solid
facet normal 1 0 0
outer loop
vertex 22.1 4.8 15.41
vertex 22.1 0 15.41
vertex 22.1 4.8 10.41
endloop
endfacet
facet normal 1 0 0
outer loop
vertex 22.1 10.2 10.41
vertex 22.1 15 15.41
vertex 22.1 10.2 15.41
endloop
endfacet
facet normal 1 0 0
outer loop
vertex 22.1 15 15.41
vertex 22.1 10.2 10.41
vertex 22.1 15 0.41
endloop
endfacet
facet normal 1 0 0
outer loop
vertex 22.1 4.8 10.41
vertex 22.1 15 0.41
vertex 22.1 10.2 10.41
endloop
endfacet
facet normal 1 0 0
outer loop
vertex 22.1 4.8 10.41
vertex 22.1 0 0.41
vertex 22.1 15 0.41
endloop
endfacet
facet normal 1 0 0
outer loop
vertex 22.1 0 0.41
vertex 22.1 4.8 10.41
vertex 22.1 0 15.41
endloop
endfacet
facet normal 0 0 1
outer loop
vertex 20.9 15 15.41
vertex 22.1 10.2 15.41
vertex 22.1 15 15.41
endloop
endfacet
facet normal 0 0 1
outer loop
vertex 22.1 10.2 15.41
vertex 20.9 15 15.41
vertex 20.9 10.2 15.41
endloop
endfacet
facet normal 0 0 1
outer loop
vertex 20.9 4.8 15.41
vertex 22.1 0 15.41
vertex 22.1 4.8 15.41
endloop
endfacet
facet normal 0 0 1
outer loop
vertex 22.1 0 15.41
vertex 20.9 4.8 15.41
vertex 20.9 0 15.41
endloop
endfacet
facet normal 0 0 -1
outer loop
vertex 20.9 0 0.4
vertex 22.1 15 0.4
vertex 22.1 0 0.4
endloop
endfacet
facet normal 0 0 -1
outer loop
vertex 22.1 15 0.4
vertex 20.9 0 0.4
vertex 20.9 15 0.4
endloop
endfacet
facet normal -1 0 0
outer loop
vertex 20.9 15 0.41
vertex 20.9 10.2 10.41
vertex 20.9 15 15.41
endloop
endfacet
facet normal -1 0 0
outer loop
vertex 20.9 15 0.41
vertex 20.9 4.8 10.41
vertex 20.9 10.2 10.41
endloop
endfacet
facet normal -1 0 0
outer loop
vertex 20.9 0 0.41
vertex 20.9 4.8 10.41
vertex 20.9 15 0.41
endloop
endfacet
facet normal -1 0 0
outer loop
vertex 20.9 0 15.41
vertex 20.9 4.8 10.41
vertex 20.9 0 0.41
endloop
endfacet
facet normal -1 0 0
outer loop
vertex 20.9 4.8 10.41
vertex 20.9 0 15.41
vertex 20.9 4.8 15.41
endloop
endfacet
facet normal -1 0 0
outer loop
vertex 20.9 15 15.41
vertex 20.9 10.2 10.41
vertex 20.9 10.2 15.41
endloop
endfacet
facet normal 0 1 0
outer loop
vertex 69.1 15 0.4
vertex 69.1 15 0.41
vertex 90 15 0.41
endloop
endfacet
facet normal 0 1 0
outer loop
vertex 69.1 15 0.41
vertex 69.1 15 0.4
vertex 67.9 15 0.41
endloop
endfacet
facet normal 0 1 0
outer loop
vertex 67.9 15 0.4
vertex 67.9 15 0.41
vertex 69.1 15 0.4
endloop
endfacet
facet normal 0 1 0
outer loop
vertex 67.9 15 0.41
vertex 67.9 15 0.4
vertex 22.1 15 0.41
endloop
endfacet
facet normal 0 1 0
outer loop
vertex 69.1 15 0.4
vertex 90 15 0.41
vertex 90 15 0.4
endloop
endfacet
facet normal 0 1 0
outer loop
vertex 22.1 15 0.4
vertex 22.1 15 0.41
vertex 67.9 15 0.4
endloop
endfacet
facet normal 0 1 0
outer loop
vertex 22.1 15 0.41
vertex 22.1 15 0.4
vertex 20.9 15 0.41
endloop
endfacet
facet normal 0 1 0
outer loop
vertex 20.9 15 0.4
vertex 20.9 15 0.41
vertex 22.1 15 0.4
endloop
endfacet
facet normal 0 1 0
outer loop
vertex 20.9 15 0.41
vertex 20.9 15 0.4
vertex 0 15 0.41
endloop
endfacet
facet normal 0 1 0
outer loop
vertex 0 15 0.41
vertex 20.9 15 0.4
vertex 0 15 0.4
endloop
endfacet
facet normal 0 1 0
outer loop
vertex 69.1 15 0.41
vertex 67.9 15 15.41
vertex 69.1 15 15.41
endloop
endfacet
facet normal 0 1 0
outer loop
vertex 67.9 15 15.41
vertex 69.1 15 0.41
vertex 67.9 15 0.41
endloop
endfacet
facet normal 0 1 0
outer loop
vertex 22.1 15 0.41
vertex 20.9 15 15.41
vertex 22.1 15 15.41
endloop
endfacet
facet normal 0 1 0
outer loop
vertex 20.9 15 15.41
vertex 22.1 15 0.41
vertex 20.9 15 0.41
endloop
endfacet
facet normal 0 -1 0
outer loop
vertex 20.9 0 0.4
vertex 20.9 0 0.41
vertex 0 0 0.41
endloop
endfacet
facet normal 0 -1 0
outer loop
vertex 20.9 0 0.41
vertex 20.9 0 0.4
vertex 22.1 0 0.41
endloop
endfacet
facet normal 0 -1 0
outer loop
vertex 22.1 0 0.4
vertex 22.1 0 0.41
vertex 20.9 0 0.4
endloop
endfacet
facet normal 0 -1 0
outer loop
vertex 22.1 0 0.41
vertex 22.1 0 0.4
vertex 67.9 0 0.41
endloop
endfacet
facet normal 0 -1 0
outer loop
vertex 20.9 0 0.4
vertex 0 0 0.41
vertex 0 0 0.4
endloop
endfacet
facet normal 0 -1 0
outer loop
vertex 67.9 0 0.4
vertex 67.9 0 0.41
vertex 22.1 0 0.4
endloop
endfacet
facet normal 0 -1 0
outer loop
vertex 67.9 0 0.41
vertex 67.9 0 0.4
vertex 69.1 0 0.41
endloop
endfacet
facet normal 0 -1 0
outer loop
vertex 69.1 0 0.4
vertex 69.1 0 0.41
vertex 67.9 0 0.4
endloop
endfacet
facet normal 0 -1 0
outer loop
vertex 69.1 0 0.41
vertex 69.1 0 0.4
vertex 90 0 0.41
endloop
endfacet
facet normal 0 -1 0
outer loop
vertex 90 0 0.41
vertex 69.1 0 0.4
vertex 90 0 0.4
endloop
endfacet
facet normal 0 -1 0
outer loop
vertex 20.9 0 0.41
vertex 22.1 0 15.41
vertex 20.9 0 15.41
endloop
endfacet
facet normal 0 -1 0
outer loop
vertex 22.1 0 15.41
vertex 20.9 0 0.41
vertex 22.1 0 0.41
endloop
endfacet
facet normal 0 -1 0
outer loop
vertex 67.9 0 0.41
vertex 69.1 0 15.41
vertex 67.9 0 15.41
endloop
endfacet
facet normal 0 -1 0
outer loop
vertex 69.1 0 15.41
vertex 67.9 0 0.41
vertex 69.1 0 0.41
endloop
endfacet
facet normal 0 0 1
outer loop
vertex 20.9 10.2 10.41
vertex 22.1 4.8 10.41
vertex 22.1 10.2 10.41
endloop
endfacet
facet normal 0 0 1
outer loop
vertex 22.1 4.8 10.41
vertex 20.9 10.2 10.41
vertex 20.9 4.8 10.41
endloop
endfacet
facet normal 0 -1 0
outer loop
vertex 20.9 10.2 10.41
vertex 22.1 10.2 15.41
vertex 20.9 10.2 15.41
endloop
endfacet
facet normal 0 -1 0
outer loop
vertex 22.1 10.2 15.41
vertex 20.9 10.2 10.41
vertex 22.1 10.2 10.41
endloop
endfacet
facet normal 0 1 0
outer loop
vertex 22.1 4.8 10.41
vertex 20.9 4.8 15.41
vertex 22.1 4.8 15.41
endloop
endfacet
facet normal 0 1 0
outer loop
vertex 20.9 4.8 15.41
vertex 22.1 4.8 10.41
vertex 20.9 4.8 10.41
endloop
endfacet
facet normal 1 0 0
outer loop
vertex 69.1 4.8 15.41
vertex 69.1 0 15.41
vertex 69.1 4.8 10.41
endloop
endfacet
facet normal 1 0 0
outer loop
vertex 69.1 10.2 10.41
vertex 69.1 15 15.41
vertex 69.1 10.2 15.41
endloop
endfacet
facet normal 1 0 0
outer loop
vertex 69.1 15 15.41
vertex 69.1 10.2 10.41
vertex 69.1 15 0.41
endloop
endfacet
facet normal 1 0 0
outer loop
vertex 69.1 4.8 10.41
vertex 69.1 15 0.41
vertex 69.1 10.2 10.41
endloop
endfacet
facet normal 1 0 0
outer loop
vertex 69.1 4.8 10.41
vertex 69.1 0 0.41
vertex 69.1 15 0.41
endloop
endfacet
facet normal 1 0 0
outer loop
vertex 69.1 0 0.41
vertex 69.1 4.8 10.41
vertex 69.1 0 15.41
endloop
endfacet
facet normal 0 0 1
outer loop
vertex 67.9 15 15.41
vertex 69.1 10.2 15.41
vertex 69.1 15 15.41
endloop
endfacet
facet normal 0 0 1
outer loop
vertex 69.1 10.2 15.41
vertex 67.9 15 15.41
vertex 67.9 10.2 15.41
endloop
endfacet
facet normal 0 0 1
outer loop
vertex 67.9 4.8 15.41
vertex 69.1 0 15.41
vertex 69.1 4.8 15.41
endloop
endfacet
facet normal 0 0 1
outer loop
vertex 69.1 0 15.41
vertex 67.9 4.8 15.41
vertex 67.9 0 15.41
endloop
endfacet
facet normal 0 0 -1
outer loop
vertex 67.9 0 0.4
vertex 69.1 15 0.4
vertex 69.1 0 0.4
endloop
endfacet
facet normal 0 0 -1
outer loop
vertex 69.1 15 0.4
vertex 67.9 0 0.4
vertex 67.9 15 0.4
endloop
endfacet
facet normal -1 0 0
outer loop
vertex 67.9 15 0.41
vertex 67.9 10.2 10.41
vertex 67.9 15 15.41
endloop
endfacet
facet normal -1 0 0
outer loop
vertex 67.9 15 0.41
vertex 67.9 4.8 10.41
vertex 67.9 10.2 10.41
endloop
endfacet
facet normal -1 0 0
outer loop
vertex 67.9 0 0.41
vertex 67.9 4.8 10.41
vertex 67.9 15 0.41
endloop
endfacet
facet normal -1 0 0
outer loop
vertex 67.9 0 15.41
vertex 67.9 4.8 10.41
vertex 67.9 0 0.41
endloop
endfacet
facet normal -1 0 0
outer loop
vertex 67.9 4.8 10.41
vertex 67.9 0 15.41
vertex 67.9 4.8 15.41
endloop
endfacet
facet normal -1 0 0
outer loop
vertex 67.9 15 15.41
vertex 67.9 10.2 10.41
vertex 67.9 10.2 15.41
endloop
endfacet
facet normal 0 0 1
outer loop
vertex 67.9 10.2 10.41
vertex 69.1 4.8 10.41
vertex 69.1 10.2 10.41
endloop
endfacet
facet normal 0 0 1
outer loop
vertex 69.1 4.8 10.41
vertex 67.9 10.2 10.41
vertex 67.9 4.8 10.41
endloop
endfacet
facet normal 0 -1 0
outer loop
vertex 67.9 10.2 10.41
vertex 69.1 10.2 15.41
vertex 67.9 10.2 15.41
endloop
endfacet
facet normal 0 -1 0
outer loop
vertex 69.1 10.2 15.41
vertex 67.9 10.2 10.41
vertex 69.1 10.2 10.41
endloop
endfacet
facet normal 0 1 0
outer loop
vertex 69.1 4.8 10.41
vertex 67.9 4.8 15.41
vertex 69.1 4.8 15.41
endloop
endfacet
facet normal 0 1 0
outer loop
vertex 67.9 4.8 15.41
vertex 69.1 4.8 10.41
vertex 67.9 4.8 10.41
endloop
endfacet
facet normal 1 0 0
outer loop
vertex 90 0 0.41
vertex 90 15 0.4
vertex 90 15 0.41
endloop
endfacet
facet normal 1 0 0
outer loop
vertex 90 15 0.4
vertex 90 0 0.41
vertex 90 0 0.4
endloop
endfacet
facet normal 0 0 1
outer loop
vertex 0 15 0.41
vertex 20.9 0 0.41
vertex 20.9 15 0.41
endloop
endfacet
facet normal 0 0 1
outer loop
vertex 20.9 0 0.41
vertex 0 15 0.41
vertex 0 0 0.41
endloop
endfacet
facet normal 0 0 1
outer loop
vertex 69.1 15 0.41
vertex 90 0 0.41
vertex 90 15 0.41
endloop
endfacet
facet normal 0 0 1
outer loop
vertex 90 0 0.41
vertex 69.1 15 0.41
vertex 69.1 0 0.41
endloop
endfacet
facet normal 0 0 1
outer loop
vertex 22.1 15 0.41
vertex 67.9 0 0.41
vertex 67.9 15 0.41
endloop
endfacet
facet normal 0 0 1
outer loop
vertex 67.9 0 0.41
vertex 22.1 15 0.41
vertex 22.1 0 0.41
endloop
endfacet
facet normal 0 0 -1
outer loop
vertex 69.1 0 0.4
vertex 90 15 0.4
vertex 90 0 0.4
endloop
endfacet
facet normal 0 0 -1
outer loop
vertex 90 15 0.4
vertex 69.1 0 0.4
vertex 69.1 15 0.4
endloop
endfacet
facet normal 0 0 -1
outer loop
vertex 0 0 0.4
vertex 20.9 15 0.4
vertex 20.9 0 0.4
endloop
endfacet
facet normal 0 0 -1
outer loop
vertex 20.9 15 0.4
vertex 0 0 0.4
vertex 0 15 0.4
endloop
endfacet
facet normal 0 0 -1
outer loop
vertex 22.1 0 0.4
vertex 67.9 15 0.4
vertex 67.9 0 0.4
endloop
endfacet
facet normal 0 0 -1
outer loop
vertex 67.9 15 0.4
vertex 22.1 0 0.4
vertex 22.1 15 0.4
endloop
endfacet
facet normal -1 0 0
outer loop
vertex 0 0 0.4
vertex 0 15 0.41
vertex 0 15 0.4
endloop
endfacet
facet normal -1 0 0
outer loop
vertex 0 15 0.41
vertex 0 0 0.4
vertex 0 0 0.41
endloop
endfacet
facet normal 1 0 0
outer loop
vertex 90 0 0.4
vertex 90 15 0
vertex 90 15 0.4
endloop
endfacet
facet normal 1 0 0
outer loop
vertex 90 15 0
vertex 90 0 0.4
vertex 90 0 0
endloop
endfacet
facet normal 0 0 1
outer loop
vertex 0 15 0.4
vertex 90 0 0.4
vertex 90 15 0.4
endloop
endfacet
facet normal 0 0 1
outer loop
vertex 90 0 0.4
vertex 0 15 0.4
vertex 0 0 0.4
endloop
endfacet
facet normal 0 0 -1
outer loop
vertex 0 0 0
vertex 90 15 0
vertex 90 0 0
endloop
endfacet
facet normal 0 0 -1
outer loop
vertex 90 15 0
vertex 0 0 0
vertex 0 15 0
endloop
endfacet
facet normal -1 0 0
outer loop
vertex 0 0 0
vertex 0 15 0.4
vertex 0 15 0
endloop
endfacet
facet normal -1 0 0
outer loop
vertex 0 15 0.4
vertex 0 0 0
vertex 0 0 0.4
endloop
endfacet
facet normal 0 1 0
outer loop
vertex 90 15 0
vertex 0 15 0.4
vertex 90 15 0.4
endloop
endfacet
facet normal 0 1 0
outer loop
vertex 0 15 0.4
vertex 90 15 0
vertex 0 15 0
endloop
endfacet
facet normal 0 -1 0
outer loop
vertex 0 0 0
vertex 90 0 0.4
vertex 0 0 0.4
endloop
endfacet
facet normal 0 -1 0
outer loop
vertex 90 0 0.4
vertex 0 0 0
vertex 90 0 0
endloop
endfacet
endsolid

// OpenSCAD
// file: ../../Base/Rotation.scad
// Fischertechnik Box Foundation
// Geometry Helpers Rotation

include <PlacementOptions.scad>

// getRotatedSpace(space, rotation=NoRotation)
// Rotates the space dependent on the specified rotation

function getRotatedSpace(space, rotation=NoRotation) = [
    (rotation == Rotate90 || rotation == Rotate270) ? space.y : space.x,
    (rotation == Rotate90 || rotation == Rotate270) ? space.x : space.y
];

// Rotates the given space around the fixed left lower corner
// space = the space the children needs as width/depth list [width,depth]
// rotation = 0 Rotate0 degrees, 1 Rotate90 degrees, 2 Rotate180 degrees, 3 Rotate270 degrees (equivalent to -90)

module RotateFix(space, rotation=NoRotation) {
    dy = (rotation == Rotate0 || rotation == Rotate270) ? 0 :
        (rotation == Rotate90) ? space.x :
        space.y;
    dx = (rotation < Rotate180) ? 0 :
        (rotation == Rotate180) ? space.x :
        space.y;
    
    translate([dx, dy, 0])
        rotate([0, 0, rotations[rotation]])
            children();
}
// file: ../../Base/Alignment.scad
// Fischertechnik Box Foundation
// Geometry Helpers Alignment

include <PlacementOptions.scad>

// getAlignedX(elementWidth, spaceWidth, align=AlignRight, offset=0)
// Gets the aligned X offset of an element with the given
// width in the given space.
// elementWidth = The width of the element to positon
// spaceWidth = The space where the element should be aligned
// align = 0 AlignLeft, 1 AlignCenter, 2 AlignRight
// offset = an optional offset from the aligned position. When
// aligned left or centered, then positive values are in X direction.
// When aligned right then positive values are in negative X direction.

function getAlignedX(elementWidth, spaceWidth, align=AlignRight, offset=0) =
    (align == AlignLeft) ?
        offset :
        ((align == AlignCenter) ?
        (spaceWidth - elementWidth)/2 + offset :
        spaceWidth - offset - elementWidth);

// getAlignedY(elementDepth, spaceDepth, align=AlignTop, offset=0)
// Gets the aligned Y offset of an element with the given
// depth in the given space.
// elementDepth = The depth of the element to positon
// spaceDepth = The space where the element should be aligned
// align = 0 AlignBottom, 1 AlignCenter, 2 AlignTop
// offset = an optional offset from the aligned position. When
// aligned bottom or centered, then positive values are in Y direction.
// When aligned top then positive values are in negative Y direction.

function getAlignedY(elementDepth, spaceDepth, align=AlignTop, offset=0) =
    (align == AlignBottom) ?
        offset :
        ((align == AlignCenter) ?
        (spaceDepth - elementDepth)/2 + offset :
        spaceDepth - offset - elementDepth);
// file: ../../Base/PlacementOptions.scad
// Fischertechnik Box Foundation
// Placement Options

// Alignment
NoAlign = 0;
AlignLeft = 1;
AlignBottom = 2;
AlignCenter = 3;
AlignRight = 4;
AlignTop = 5;

// Element rotation degree steps
rotations = [0, -90, -180, -270];

// Rotation
NoRotation = 0;
Rotate0 = 0;
Rotate90 = 1;
Rotate180 = 2;
Rotate270 = 3;

// Docking (seen from above)
NoDock = -1;
DockLeft = 0;
DockTop = 1;
DockRight = 2;
DockCorner = 2;
DockBottom = 3;

// Web corners
LowerLeft = 0;
UpperLeft = 1;
UpperRight = 2;
LowerRight = 3;

// Web position relative to corner
LeftOfCorner = 0;
RightOfCorner = 1;
// file: ../../Base/Boxes.scad
// Fischertechnik Box Foundation
// Pre-designed Boxes

use <Constants.scad>

include <PlacementOptions.scad>

box190Width = 190;
box190Depth = 130;
box130Width = 130;
box130Depth = 95;

// Values are from an original ec3 box
topBottomDifference = 1.5;
outerHeight = 40;
innerHeight = 38.2;
baseThickness = outerHeight - innerHeight;
stackExcess = 5.7;
radius = 3.5;
wallThickness = 1.5;
tolerance = 0.2;
stackOffset = innerHeight - stackExcess;

boxUsageHeight = stackOffset;
boxWallThickness = wallThickness;
boxBaseThickness = baseThickness;
boxWebWidth = 3.0;

// getBoxWallThickness()
// Gets the wall thickness of a Fischertechnik Box
function getBoxWallThickness() = boxWallThickness;

// getBoxUsageHeight()
// Gets the usable height of a Fischertechnik box
function getBoxUsageHeight() = boxUsageHeight;

// getBoxInnerHeight()
// Gets the inner height of a Fischertechnik box, including the stack excess
function getBoxInnerHeight() = innerHeight;

// getBoxBaseThickness()
// Gets the thickness of the Fischertechnik box base.
function getBoxBaseThickness() = boxBaseThickness;

// getBoxWebWidth()
// Gets the width of a box web
function getBoxWebWidth() = boxWebWidth;

// getBox190Space()
// Gets the usable inner space of a Box 190 as an x/y-list
function getBox190Space() = [
    box190Width - 2*getBoxWallThickness() - topBottomDifference, 
    box190Depth - 2*getBoxWallThickness() - topBottomDifference ];

// BoxBase(width, depth)
// Creates an empty stackable Fischertechnik compatible box
// width = Outer width of the box (190, 130, ...)
// depth = Outer depth of the box (130, 95, ...)

module BoxBase(width, depth, height=outerHeight) {    
    thinPlate = 0.01;

    innerHeight = height - baseThickness;    
    
    module BodyPlate(width, depth) {
        translate([radius, radius])
        hull() {
            w = width-2*radius;
            d = depth-2*radius;
            cube([w, d, thinPlate]);
            cylinder(thinPlate, r=radius, $fn=getFragments());
            translate([w, 0])
                cylinder(thinPlate, r=radius, $fn=getFragments());
            translate([w, d])
                cylinder(thinPlate, r=radius, $fn=getFragments());
            translate([0, d])
                cylinder(thinPlate, r=radius, $fn=getFragments());
        }
    }
    
    module Body(tolerance=tolerance) {
        hull() {
            // Bottom with tolerance to fit into the original boxes when stacked
            translate([-wallThickness+tolerance, -wallThickness+tolerance, -baseThickness])
                BodyPlate(width-topBottomDifference-2*tolerance, depth-topBottomDifference-2*tolerance);
            
            // Top
            translate([-wallThickness-topBottomDifference/2, -wallThickness-topBottomDifference/2, innerHeight-thinPlate])
                BodyPlate(width, depth);
         }
    }

    module Cutoff() {
        hull() {
            coWidth = width - 2*wallThickness;
            coDepth = depth - 2*wallThickness;
            
            // Bottom
            BodyPlate(coWidth-topBottomDifference, coDepth-topBottomDifference);

            // Top
            translate([-topBottomDifference/2, -topBottomDifference/2, innerHeight+thinPlate]) 
                BodyPlate(coWidth, coDepth);
        }
    }
    
    difference() {        
        Body();
        Cutoff();
        stackOffset = innerHeight - stackExcess;
        translate([0, 0, stackOffset + baseThickness])
            Body(tolerance=0);
    }
}

// Creates the Fischertechnik empty box 130x190 mm and places it at position 0,0
// 190x130 are the outer sizes, the inner space is slightly smaller. Use getBox190Space() to get the inner sizes.
// The box is positioned that the usable inner space is at the 0,0,0 position. The

module Box190() {
    BoxBase(box190Width, box190Depth);
}

// Gets the usable inner space of a Box 130 as an x/y-list
function getBox130Space() = [
    box130Width - 2*getBoxWallThickness() - topBottomDifference, 
    box130Depth - 2*getBoxWallThickness() - topBottomDifference ];

// Creates the Fischertechnik empty box 95x130 mm and places it at position 0,0
// 190x130 are the outer sizes, the inner space is slightly smaller. Use getBox190Space() to get the inner sizes.
// The box is positioned that the usable inner space is at the 0,0,0 position. The

module Box130() {
    BoxBase(box130Width, box130Depth);
}

// Creates a web at the specified box walls
// corner 0 = LowerLeft, 1 = UpperLeft, 2 = UpperRight, 3 = LowerRight
// side 0 = LeftOfCorner, 1 = RightOfCorner
// distance = Distance in mm from the corner
// boxSpace = inner width and depth of the box (default: Box 190)
// webWidth = length of the web (default is 3 mms)
// webThickness = thickness of the web (default is 1 mm)

module BoxWeb(corner, side, distance, boxSpace=getBox190Space(), webWidth=getBoxWebWidth(), webThickness=1.0) {
    sink = getBoxWallThickness()/2;

    width = (corner % 2 == 0) ? 
            (side == LeftOfCorner ? webWidth : webThickness) :
            (side == LeftOfCorner ? webThickness : webWidth);

    depth = (corner % 2 == 0) ? 
            (side == RightOfCorner ? webWidth : webThickness) :
            (side == RightOfCorner ? webThickness : webWidth);
    
    xDiff = corner == LowerLeft ? 
                (side == LeftOfCorner ? -sink : distance) :
            (corner == UpperLeft ?                
                (side == LeftOfCorner ? distance : -sink) :
            (corner == UpperRight ?
                (side == LeftOfCorner ? boxSpace.x-webWidth+sink : boxSpace.x-distance-webThickness) :
                (side == LeftOfCorner ? boxSpace.x-distance-webThickness: boxSpace.x-webWidth+sink)));

    yDiff = corner == LowerLeft ? 
                (side == RightOfCorner ? -sink : distance) :
            (corner == UpperLeft ?
                (side == RightOfCorner ? boxSpace.y-distance : boxSpace.y-webWidth+sink) :
            (corner == UpperRight ?
                (side == RightOfCorner ? boxSpace.y-webWidth+sink : boxSpace.y-distance) :
                (side == RightOfCorner ? distance : -sink)));
    
    translate([xDiff, yDiff, -getExcess()])
        cube([width, depth, boxUsageHeight + 2*getExcess()]);
}
// file: ../../Base/Placement.scad
// Fischertechnik Box Foundation
// Geometry Helpers Placement

use <Constants.scad>
use <Alignment.scad>
use <Rotation.scad>
use <Boxes.scad>

include <PlacementOptions.scad>

// Place(x=0, y=0, elementSpace=[0,0], alignX=AlignLeft, alignY=AlignBottom, rotation=Rotate0, boxSpace=getBox190Space())
// Places the child at the specified position
// y = Y-Position. This is a relative position when an X aligment is specified.
// x = X-Position. This is a relative position when an Y aligment is specified.
// elementSpace = space of the element to be placed [x,y]
// alignX = -1=NoAlign, 0 AlignLeft, 1 AlignCenter, 3 AlignRight (elementSpace and boxSpace required!)
// alignY = -1=NoAlign, 2 AlignBottom, 1 AlignCenter, 4 AlignTop (elementSpace and boxSpace required!)
// rotation = 0 Rotate0 0 degrees, 1 Rotate90 90 degrees, 
// 2 Rotate180 180 degrees, 3 Rotate270 270 degrees (equivalent to -90)
// boxSpace = Inner space of the box where the placement occurs [x,y] - default is Box 190x130 inner space

module Place(x=0, y=0, elementSpace=[0,0], 
  alignX=AlignLeft, alignY=AlignBottom, 
  rotation=NoRotation, boxSpace=getBox190Space()) {

    module Position(x, y, space, rotation=Rotate0) {
        translate([x, y, 0])
            RotateFix(space, rotation)
                children();
    }

    space = getRotatedSpace(elementSpace, rotation);
    alignedX = getAlignedX(space.x, boxSpace.x, alignX, x);
    alignedY = getAlignedY(space.y, boxSpace.y, alignY, y);
    Position(alignedX, alignedY, elementSpace, rotation)
        children();
}

// Center(space=getBox130Space(), elementSpace=[0,0])
// space = Space where the children is centered. For cylinder use centered=true and no elementSpace.
// elementSpace = space of the element to be centered [x,y]

module Center(space=getBox190Space(), elementSpace=[0,0]) {
    Place(elementSpace=elementSpace, boxSpace=space, alignX=AlignCenter, alignY=AlignCenter)
        children();
}

// CenterHorizontal(width=0, y=0, offset=0, space=getBox130Space())
// width = Width of the element to be placed.
// y = Y position of the element
// offset = Offset from the center position (negative will be left of the center)
// space = Space where the element is placed

module CenterHorizontal(width=0, y=0, offset=0, space=getBox190Space()) {
    Place(x=offset, y=y, elementSpace=[width, 0], boxSpace=space, alignX=AlignCenter)
        children(0);
}

// CenterVertical(depth=0, x=0, offset=0, space=getBox130Space())
// depth = Depth of the element to be placed.
// x = X position of the element
// offset = Offset from the center position (negative will be down of the center)
// space = Space where the element is placed

module CenterVertical(depth=0, x=0, offset=0, space=getBox190Space()) {
    Place(x=x, y=offset, elementSpace=[0, depth], boxSpace=space, alignY=AlignCenter)
        children(0);
}

// getIsVertical(align)
// True if the specified alignment needs a vertical orientation for a divider (AlignRight, AlignLeft)

function getIsVertical(align) = (align == AlignRight || align == AlignLeft);

// getIsHorizontal(align)
// True if the specified alignment needs a horizontal orientation for a divider (AlignTop, AlignBottom)

function getIsHorizontal(align) = (align == AlignTop || align == AlignBottom);
// file: ../../Elements/AxisClip10.scad
// Fischertechnik Box Library
// Axis for clip 10
// 31023

use <../ModelBase/Simple.scad>
use <../Base/Constants.scad>

width = 12;
depth = 12;
height = 23;
upperDiameter = 3.6;
clipHeight = 10;

// getAxisClip10Space()
// Gets the space of a frame for a clip 10 with spring ring (mot2)

function getAxisClip10Space() = [width, depth, height];

// AxisClip10(height, clipHeight)
// Axis for clip 10 with spring ring (mot2)
// height = Height of the complete axis
// clipHeight = Height of the rt for the clip (standard is 10, in mot3 its only 7)

module AxisClip10(height=height, clipHeight=clipHeight) {
    LeveledAxisWithSpace(height, height-clipHeight, getAxisClip10Space(), diameter=upperDiameter);
}

// Tests
color("lightgray")
AxisClip10();
// file: ../../Base/Constants.scad
// Fischertechnik Box Foundation
// Constants

// Constant values necessary for multiple elements

// Base constants
dividerThickness = 1.2;
excess = 0.01;
fragments = 90;
tolerance = 0.8;

// Gets the thickness of a divider 
function getDividerThickness() = dividerThickness;

// Gets the excess that is used to merge walls into each other
function getExcess() = excess;

// Gets amount of fragments of a cylinder
function getFragments() = fragments;

// Gets the inner tolerance of a frame to each side
function getTolerance() = tolerance;


// Fischertechnik specific constants
axisDiameter = 4;
axisBottomDiameter = axisDiameter + 1;
standardEdgeDistance = 2.5;
standardWebDistance = 11.5;
standardCornerLength = 15;
tubeWallFactor = 0.8;
smallPartsFrameHeight = 20;

// Gets axis diameter
function getAxisDiameter() = axisDiameter;

// Gets axis bottom diameter for thicker part at the bottom
function getAxisBottomDiameter() = axisBottomDiameter;

// gets the standard distance to the wall of the box for dockable frames with webs
function getStandardEdgeDistance() = standardEdgeDistance;

// gets the standard distance of each web to the corner of the dockable frame
function getStandardWebDistance() = standardWebDistance;

// gets the standard length of the corner walls of a dockable frame
function getStandardCornerLength() = standardCornerLength;

// gets the wall thickness of a tube.
function getTubeWallThickness() = tubeWallFactor * getDividerThickness();

// gets the frame height for docked small parts boxes.
function getSmallPartsFrameHeight() = smallPartsFrameHeight;
// file: ../../Elements/HolderLinkBeam.scad
// Fischertechnik Box Library
// Holder for Link Beam
// 38418

use <../Base/Constants.scad>
use <../ModelBase/Simple.scad>

width = 90;
depth = 15;

// getHolderLinkBeamSpace()
// Gets the width and depth of the space the lonk beam holder needs.
function getHolderLinkBeamSpace() = [width, depth];

// HolderLinkBeam()
// Holder for a Link Beam

module HolderLinkBeam() {
    height = 15 + getExcess();
    distance = 45 + getTolerance();
    cutoffDepth = 5.4;
    cutoffHeight = 5;
    
    module Holder(xOffset) {
        midOffset = (depth - cutoffDepth) / 2;
        
        translate([xOffset, 0, -getExcess()]) {
            difference() {
                cube([getDividerThickness(), depth, height]);
                translate([-getExcess()/2, midOffset, height - cutoffHeight])
                    cube([getDividerThickness()*2, cutoffDepth, cutoffHeight + getExcess()]);
            }
        }
    }

    Space([width, depth, height]);
    
    xOffsetLeft = (width - distance) / 2 - getDividerThickness();
    Holder(xOffsetLeft);

    xOffsetRight = width - xOffsetLeft - getDividerThickness();
    Holder(xOffsetRight);
}

// Test
color("lightgray")
HolderLinkBeam();
// file: ../TestPrint.scad
// 3D Print Test Base

use <../Base/Constants.scad>

use <../Elements/AxisClip10.scad>

module TestPrint(elementSpace) {
    cube([elementSpace.x, elementSpace.y, 0.4]);
    translate([0,0,0.4+getExcess()]) {
        children();
    }
}

TestPrint(getAxisClip10Space())
    AxisClip10();
// main file
// 3D Print Test
// HolderLinkBeam

use <../TestPrint.scad>
use <../../Elements/HolderLinkBeam.scad>

TestPrint(getHolderLinkBeamSpace())
    HolderLinkBeam();
